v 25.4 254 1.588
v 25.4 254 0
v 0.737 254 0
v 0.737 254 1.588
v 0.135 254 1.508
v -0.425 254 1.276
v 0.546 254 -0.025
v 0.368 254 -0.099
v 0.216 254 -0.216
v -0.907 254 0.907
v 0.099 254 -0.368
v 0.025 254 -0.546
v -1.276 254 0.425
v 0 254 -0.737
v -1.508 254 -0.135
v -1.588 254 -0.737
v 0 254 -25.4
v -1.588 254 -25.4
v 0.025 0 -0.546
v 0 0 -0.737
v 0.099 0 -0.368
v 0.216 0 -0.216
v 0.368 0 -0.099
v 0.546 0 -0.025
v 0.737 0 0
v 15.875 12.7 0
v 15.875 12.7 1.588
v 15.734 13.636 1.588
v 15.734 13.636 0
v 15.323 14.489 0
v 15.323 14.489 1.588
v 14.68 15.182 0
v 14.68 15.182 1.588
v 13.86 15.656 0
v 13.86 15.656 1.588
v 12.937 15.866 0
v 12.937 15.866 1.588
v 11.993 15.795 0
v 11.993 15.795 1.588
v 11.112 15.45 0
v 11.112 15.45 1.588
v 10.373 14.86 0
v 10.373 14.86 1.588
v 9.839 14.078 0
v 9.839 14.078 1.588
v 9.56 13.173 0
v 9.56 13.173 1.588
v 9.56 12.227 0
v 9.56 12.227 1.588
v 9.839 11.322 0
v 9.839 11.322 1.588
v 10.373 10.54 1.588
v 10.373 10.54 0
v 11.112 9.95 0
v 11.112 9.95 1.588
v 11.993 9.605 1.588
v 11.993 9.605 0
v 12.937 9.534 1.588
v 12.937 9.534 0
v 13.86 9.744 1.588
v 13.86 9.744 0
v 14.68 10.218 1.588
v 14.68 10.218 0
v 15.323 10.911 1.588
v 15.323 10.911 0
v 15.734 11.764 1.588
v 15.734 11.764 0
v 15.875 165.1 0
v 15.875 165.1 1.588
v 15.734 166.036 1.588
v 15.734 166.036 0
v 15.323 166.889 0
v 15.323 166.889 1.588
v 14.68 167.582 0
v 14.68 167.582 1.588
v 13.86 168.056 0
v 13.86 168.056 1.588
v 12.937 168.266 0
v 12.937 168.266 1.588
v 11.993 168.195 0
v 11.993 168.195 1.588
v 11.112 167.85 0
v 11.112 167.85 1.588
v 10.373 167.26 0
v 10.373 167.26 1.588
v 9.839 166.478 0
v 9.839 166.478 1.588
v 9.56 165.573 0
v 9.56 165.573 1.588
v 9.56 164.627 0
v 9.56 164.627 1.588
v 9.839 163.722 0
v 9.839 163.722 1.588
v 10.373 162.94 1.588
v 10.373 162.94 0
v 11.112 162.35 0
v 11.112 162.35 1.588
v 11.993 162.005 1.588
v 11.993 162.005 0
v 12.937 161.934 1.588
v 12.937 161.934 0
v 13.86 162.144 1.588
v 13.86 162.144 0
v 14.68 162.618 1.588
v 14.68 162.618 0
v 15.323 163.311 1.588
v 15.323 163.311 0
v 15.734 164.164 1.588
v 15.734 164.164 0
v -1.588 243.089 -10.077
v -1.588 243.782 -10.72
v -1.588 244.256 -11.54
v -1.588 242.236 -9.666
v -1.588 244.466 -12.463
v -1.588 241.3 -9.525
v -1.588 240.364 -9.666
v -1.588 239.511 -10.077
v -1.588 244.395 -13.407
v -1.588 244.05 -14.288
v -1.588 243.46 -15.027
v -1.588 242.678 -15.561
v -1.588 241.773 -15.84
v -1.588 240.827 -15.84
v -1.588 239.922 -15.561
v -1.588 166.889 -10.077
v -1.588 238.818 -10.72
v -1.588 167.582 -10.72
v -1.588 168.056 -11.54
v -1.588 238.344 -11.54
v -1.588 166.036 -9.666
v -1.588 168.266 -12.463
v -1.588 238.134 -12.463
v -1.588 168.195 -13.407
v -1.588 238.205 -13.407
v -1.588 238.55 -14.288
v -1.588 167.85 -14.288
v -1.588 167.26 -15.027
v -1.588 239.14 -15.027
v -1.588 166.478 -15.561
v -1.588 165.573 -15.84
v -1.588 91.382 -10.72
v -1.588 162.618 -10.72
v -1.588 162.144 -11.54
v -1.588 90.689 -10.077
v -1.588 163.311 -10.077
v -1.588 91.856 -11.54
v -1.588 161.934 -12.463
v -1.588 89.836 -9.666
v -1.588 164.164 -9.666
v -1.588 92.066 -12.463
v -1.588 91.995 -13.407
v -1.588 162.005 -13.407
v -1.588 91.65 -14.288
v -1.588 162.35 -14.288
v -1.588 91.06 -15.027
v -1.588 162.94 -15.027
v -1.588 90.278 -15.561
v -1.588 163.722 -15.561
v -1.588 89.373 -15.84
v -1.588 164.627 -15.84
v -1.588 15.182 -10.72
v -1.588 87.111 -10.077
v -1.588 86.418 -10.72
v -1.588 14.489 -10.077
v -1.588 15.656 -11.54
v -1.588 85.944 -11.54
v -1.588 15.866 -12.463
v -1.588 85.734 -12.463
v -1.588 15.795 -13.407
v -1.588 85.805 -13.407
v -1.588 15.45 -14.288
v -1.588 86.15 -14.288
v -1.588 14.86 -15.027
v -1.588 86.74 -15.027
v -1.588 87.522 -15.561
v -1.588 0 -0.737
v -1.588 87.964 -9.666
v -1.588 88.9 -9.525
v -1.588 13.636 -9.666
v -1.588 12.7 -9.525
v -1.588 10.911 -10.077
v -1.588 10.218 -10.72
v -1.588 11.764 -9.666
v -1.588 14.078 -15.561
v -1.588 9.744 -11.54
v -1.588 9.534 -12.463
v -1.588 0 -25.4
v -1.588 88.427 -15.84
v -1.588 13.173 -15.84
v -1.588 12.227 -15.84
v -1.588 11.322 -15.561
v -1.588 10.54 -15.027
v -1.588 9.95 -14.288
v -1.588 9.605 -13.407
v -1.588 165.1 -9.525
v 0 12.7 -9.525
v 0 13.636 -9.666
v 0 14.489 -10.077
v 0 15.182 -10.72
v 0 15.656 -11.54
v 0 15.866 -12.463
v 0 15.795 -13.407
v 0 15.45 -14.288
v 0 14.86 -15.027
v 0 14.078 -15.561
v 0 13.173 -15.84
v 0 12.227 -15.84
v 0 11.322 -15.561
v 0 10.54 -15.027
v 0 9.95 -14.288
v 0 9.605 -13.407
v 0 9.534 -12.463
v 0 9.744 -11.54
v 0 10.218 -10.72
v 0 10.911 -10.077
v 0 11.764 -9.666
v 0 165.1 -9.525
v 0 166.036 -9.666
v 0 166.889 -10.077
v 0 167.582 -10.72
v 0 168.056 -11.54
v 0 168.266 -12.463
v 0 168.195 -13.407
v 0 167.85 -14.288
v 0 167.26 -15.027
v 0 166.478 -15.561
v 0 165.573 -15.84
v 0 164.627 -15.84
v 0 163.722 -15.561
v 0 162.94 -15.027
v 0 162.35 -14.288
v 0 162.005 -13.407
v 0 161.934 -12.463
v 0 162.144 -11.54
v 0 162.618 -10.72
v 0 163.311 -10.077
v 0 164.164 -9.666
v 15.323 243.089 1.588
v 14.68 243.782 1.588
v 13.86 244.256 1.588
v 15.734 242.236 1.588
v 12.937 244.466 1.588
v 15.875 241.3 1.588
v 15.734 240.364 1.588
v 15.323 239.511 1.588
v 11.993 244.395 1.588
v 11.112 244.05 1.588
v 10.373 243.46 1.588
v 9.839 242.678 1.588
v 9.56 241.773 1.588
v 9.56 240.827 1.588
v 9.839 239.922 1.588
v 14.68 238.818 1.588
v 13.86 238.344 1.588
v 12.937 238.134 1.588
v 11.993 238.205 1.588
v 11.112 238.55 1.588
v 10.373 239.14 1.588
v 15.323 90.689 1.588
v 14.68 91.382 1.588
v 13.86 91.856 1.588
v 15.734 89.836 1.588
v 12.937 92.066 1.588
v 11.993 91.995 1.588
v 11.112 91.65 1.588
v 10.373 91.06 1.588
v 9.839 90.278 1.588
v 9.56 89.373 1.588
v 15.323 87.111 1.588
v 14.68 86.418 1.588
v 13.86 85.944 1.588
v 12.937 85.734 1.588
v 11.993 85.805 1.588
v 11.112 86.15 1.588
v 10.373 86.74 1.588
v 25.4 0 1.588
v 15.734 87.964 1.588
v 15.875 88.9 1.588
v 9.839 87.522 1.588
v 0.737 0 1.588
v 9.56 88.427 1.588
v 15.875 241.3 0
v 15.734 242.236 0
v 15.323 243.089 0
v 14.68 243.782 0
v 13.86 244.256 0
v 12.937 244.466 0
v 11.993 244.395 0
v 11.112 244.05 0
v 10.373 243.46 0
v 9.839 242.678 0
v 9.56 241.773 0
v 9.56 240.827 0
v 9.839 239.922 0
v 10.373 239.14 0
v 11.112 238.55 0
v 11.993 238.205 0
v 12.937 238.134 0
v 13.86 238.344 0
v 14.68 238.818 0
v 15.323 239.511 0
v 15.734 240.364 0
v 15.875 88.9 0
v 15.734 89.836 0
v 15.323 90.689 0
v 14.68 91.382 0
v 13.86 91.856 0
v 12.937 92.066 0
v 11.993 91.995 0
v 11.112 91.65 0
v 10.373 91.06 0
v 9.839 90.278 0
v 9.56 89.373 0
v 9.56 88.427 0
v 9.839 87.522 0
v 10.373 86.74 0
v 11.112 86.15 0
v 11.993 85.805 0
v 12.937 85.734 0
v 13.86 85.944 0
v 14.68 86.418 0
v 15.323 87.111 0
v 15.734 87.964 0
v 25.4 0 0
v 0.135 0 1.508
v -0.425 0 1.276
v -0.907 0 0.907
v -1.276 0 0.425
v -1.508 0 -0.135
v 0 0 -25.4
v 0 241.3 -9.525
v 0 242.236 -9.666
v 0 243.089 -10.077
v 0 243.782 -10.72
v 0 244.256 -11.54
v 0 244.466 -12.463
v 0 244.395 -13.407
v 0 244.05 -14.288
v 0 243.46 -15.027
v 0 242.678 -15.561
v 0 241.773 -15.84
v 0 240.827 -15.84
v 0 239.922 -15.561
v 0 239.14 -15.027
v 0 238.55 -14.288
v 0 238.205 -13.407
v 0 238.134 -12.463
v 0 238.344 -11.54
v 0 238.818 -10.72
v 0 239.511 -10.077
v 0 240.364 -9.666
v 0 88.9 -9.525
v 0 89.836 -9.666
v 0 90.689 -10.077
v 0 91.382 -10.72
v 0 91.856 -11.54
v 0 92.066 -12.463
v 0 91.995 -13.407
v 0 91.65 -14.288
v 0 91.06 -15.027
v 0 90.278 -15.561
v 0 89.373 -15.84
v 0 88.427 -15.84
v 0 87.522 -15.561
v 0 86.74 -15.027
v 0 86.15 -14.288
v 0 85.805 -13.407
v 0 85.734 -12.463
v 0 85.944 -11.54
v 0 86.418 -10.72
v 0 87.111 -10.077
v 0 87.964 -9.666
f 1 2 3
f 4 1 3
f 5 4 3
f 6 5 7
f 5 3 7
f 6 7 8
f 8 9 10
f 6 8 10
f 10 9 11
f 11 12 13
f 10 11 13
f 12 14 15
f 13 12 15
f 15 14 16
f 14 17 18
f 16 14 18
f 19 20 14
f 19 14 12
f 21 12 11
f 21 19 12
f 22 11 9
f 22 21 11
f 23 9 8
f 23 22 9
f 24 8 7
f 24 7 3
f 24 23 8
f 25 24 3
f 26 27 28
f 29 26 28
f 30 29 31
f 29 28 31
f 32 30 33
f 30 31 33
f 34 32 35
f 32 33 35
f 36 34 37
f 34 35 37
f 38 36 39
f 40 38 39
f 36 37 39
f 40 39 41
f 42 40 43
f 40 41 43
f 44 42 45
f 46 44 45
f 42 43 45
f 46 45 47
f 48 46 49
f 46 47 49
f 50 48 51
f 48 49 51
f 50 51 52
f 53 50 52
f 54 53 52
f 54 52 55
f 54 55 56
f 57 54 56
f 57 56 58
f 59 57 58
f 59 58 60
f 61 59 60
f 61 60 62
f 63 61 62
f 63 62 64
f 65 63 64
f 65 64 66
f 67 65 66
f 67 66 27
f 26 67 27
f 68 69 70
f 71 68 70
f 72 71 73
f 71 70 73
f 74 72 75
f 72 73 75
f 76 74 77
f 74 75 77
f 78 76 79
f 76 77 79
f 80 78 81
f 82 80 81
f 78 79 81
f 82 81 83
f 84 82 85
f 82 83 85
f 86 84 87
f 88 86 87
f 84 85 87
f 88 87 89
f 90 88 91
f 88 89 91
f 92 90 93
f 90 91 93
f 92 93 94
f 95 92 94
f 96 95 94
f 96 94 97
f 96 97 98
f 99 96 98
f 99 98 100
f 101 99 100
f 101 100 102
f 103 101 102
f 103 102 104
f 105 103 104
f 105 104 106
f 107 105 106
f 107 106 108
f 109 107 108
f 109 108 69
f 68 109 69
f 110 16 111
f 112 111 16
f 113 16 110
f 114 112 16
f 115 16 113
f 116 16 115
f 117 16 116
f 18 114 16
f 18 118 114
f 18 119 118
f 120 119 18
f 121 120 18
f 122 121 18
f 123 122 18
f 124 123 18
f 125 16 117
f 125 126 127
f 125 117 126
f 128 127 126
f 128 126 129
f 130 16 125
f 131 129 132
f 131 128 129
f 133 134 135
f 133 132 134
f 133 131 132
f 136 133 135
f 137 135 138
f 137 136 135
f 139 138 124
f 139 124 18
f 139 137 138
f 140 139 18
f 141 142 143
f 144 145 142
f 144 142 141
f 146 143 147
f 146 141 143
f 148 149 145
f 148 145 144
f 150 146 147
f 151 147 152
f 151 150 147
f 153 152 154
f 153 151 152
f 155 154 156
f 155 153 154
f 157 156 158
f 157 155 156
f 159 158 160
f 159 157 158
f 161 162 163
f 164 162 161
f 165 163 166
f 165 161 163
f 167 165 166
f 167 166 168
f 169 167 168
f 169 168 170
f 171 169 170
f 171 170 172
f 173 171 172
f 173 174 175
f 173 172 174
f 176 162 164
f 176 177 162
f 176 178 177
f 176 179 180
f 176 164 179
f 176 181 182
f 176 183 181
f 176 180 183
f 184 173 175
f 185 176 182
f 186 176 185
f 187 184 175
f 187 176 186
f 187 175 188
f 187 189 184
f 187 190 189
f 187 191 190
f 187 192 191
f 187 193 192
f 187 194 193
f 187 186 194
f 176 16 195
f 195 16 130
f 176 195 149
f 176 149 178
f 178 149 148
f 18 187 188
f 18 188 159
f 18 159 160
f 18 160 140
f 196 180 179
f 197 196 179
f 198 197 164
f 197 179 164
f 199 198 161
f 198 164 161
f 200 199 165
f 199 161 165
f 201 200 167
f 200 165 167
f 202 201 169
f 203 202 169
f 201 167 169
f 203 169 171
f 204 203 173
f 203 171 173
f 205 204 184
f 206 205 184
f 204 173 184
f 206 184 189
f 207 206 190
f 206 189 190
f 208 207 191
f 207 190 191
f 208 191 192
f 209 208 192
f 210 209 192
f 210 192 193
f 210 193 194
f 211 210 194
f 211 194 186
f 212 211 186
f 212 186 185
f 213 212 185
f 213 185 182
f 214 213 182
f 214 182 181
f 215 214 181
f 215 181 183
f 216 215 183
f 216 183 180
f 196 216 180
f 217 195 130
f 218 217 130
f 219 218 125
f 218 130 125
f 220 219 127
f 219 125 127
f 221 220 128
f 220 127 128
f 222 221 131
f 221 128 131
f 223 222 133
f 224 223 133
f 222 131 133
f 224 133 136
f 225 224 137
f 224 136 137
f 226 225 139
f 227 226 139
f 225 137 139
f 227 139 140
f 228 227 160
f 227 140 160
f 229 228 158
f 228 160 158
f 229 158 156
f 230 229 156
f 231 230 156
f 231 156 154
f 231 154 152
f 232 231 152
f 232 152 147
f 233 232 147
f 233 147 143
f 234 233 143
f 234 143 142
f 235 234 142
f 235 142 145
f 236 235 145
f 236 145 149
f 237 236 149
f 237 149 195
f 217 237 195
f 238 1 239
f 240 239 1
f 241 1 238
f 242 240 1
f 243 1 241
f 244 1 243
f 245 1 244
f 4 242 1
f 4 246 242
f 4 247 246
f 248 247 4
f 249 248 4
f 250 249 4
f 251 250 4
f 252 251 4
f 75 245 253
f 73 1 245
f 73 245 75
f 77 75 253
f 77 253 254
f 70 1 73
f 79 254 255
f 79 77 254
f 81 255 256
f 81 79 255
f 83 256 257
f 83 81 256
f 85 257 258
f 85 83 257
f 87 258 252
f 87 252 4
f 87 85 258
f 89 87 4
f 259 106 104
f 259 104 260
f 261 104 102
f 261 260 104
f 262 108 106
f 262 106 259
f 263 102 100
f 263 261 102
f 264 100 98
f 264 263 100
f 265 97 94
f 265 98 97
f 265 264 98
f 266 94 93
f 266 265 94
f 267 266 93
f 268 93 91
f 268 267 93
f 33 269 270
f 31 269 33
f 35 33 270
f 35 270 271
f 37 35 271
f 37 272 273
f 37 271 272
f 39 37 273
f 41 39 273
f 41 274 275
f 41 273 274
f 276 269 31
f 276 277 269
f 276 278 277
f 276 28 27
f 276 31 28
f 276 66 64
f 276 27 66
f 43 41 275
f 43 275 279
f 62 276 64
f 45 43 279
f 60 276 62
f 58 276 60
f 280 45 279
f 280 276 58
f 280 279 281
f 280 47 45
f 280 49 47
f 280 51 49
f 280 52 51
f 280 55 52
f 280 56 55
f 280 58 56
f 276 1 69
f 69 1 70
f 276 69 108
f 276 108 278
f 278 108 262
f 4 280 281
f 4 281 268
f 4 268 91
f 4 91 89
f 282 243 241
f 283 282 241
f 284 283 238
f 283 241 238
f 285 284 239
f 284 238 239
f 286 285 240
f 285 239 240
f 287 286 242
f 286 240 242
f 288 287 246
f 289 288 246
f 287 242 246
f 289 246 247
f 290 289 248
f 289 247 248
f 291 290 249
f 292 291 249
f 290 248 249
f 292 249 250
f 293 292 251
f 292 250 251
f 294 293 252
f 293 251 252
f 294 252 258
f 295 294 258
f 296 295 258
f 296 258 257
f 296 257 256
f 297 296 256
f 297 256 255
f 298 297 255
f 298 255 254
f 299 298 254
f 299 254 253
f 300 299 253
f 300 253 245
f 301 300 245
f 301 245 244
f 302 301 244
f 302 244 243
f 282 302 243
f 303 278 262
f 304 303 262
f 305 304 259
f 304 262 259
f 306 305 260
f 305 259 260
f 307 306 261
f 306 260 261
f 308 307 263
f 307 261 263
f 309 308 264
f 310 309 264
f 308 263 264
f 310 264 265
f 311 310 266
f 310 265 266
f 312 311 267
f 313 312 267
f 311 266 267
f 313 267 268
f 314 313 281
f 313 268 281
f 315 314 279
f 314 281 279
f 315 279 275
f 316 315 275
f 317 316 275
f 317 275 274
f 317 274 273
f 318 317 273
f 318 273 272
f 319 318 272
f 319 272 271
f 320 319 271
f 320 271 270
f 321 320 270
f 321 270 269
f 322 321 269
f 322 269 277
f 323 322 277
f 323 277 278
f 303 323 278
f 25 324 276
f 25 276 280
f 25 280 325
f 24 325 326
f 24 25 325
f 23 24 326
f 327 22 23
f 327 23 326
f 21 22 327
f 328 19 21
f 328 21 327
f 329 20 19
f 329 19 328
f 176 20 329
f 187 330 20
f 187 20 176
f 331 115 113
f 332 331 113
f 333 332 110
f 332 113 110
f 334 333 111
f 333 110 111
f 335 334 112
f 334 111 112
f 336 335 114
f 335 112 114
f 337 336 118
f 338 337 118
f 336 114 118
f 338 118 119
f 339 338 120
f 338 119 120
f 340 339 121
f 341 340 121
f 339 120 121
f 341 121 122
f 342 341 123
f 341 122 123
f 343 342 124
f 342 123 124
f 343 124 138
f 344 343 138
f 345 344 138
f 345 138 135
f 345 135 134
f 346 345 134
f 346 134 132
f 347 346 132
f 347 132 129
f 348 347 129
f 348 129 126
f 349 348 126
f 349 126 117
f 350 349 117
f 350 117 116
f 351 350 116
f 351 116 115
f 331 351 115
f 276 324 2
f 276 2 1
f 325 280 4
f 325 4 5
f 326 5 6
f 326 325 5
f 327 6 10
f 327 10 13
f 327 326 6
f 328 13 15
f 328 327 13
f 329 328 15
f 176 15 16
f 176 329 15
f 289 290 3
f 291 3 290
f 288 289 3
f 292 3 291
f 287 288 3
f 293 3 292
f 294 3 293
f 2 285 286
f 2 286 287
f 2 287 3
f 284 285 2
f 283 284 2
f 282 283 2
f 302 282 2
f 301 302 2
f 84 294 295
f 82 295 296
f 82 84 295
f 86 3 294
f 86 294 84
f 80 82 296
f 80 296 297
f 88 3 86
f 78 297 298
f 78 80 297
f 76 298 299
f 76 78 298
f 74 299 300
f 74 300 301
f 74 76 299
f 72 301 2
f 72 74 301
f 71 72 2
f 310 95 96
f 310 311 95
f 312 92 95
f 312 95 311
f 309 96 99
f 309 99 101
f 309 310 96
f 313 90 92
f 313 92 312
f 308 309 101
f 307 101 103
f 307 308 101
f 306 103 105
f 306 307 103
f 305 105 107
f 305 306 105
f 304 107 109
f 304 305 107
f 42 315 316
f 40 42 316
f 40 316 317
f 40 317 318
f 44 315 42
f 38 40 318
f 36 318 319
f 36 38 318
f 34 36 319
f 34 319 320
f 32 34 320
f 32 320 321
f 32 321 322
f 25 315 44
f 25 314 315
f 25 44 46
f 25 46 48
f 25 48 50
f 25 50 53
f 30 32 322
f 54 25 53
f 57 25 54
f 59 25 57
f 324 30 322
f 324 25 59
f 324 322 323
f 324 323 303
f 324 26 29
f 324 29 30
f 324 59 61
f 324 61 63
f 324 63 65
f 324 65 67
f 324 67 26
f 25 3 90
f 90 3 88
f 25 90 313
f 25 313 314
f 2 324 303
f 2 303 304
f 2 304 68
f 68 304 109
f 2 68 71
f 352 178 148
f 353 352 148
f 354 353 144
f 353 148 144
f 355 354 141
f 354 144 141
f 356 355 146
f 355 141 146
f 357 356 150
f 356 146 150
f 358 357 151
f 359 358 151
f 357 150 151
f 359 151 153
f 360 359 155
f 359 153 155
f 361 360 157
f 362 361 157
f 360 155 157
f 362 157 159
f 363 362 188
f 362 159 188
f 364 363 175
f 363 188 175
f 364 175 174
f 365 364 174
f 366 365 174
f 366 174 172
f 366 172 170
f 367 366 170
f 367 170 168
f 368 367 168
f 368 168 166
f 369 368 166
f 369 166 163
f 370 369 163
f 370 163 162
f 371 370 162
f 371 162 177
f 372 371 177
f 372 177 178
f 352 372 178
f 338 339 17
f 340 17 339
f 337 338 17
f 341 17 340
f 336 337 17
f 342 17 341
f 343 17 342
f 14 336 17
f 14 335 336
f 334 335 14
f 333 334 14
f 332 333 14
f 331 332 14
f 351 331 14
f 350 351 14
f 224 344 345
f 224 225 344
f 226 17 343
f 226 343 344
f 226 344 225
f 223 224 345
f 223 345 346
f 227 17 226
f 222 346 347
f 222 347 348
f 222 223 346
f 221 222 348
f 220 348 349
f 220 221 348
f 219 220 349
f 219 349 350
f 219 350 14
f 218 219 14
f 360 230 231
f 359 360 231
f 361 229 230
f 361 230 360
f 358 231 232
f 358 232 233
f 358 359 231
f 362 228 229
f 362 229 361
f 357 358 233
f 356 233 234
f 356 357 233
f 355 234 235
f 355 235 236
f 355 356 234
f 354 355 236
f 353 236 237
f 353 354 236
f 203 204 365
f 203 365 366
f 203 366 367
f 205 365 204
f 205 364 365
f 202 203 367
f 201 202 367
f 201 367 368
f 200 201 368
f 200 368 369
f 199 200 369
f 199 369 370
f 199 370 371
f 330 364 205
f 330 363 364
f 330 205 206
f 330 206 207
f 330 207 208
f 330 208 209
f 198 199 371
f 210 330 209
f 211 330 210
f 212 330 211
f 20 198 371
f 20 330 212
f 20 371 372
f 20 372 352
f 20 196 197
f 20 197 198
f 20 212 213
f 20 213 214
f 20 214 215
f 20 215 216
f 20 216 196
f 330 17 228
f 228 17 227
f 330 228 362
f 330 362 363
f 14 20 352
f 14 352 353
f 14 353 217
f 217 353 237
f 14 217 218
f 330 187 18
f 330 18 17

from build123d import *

# Parameters (mm, degrees)
BASE_FLANGE1_DEPTH = 254
SKETCH6_R          = 3.175
CUT_EXTRUDE1_DEPTH = 257.689472235
SKETCH7_R          = 3.175
CUT_EXTRUDE2_DEPTH = 257.689472235


# Sheet-metal steps are written as plain solids
with BuildPart() as part:
    # Sketch1 → Base-Flange1 (new body)
    with BuildSketch(Plane(origin=(0, 0, 0), x_dir=(1, 0, 0), z_dir=(0, 1, 0))):
        with BuildLine():
            Line((0, 25.4), (0, 0.7366))
            ThreePointArc((0, 0.7366), (0.215745145, 0.215745145), (0.7366, 0))
            Line((0.7366, 0), (25.4, 0))
            Line((25.4, 0), (25.4, -1.5875))
            Line((25.4, -1.5875), (0.7366, -1.5875))
            ThreePointArc((0.7366, -1.5875), (-0.90678687, -0.90678687), (-1.5875, 0.7366))
            Line((-1.5875, 0.7366), (-1.5875, 25.4))
            Line((-1.5875, 25.4), (0, 25.4))
        make_face()
    extrude(amount=BASE_FLANGE1_DEPTH)

    # Sketch6 → Cut-Extrude1 (cut, through all)
    with BuildSketch(Plane.XY.offset(1.5875)):
        with Locations((12.7, 241.3)):
            Circle(SKETCH6_R)
        with Locations((12.7, 165.1)):
            Circle(SKETCH6_R)
        with Locations((12.7, 88.9)):
            Circle(SKETCH6_R)
        with Locations((12.7, 12.7)):
            Circle(SKETCH6_R)
    extrude(amount=-CUT_EXTRUDE1_DEPTH, mode=Mode.SUBTRACT)

    # Sketch7 → Cut-Extrude2 (cut, through all)
    with BuildSketch(Plane.ZY.offset(1.5875)):
        with Locations((-12.7, 241.3)):
            Circle(SKETCH7_R)
        with Locations((-12.7, 165.1)):
            Circle(SKETCH7_R)
        with Locations((-12.7, 88.9)):
            Circle(SKETCH7_R)
        with Locations((-12.7, 12.7)):
            Circle(SKETCH7_R)
    extrude(amount=-CUT_EXTRUDE2_DEPTH, mode=Mode.SUBTRACT)


solid = part.part
